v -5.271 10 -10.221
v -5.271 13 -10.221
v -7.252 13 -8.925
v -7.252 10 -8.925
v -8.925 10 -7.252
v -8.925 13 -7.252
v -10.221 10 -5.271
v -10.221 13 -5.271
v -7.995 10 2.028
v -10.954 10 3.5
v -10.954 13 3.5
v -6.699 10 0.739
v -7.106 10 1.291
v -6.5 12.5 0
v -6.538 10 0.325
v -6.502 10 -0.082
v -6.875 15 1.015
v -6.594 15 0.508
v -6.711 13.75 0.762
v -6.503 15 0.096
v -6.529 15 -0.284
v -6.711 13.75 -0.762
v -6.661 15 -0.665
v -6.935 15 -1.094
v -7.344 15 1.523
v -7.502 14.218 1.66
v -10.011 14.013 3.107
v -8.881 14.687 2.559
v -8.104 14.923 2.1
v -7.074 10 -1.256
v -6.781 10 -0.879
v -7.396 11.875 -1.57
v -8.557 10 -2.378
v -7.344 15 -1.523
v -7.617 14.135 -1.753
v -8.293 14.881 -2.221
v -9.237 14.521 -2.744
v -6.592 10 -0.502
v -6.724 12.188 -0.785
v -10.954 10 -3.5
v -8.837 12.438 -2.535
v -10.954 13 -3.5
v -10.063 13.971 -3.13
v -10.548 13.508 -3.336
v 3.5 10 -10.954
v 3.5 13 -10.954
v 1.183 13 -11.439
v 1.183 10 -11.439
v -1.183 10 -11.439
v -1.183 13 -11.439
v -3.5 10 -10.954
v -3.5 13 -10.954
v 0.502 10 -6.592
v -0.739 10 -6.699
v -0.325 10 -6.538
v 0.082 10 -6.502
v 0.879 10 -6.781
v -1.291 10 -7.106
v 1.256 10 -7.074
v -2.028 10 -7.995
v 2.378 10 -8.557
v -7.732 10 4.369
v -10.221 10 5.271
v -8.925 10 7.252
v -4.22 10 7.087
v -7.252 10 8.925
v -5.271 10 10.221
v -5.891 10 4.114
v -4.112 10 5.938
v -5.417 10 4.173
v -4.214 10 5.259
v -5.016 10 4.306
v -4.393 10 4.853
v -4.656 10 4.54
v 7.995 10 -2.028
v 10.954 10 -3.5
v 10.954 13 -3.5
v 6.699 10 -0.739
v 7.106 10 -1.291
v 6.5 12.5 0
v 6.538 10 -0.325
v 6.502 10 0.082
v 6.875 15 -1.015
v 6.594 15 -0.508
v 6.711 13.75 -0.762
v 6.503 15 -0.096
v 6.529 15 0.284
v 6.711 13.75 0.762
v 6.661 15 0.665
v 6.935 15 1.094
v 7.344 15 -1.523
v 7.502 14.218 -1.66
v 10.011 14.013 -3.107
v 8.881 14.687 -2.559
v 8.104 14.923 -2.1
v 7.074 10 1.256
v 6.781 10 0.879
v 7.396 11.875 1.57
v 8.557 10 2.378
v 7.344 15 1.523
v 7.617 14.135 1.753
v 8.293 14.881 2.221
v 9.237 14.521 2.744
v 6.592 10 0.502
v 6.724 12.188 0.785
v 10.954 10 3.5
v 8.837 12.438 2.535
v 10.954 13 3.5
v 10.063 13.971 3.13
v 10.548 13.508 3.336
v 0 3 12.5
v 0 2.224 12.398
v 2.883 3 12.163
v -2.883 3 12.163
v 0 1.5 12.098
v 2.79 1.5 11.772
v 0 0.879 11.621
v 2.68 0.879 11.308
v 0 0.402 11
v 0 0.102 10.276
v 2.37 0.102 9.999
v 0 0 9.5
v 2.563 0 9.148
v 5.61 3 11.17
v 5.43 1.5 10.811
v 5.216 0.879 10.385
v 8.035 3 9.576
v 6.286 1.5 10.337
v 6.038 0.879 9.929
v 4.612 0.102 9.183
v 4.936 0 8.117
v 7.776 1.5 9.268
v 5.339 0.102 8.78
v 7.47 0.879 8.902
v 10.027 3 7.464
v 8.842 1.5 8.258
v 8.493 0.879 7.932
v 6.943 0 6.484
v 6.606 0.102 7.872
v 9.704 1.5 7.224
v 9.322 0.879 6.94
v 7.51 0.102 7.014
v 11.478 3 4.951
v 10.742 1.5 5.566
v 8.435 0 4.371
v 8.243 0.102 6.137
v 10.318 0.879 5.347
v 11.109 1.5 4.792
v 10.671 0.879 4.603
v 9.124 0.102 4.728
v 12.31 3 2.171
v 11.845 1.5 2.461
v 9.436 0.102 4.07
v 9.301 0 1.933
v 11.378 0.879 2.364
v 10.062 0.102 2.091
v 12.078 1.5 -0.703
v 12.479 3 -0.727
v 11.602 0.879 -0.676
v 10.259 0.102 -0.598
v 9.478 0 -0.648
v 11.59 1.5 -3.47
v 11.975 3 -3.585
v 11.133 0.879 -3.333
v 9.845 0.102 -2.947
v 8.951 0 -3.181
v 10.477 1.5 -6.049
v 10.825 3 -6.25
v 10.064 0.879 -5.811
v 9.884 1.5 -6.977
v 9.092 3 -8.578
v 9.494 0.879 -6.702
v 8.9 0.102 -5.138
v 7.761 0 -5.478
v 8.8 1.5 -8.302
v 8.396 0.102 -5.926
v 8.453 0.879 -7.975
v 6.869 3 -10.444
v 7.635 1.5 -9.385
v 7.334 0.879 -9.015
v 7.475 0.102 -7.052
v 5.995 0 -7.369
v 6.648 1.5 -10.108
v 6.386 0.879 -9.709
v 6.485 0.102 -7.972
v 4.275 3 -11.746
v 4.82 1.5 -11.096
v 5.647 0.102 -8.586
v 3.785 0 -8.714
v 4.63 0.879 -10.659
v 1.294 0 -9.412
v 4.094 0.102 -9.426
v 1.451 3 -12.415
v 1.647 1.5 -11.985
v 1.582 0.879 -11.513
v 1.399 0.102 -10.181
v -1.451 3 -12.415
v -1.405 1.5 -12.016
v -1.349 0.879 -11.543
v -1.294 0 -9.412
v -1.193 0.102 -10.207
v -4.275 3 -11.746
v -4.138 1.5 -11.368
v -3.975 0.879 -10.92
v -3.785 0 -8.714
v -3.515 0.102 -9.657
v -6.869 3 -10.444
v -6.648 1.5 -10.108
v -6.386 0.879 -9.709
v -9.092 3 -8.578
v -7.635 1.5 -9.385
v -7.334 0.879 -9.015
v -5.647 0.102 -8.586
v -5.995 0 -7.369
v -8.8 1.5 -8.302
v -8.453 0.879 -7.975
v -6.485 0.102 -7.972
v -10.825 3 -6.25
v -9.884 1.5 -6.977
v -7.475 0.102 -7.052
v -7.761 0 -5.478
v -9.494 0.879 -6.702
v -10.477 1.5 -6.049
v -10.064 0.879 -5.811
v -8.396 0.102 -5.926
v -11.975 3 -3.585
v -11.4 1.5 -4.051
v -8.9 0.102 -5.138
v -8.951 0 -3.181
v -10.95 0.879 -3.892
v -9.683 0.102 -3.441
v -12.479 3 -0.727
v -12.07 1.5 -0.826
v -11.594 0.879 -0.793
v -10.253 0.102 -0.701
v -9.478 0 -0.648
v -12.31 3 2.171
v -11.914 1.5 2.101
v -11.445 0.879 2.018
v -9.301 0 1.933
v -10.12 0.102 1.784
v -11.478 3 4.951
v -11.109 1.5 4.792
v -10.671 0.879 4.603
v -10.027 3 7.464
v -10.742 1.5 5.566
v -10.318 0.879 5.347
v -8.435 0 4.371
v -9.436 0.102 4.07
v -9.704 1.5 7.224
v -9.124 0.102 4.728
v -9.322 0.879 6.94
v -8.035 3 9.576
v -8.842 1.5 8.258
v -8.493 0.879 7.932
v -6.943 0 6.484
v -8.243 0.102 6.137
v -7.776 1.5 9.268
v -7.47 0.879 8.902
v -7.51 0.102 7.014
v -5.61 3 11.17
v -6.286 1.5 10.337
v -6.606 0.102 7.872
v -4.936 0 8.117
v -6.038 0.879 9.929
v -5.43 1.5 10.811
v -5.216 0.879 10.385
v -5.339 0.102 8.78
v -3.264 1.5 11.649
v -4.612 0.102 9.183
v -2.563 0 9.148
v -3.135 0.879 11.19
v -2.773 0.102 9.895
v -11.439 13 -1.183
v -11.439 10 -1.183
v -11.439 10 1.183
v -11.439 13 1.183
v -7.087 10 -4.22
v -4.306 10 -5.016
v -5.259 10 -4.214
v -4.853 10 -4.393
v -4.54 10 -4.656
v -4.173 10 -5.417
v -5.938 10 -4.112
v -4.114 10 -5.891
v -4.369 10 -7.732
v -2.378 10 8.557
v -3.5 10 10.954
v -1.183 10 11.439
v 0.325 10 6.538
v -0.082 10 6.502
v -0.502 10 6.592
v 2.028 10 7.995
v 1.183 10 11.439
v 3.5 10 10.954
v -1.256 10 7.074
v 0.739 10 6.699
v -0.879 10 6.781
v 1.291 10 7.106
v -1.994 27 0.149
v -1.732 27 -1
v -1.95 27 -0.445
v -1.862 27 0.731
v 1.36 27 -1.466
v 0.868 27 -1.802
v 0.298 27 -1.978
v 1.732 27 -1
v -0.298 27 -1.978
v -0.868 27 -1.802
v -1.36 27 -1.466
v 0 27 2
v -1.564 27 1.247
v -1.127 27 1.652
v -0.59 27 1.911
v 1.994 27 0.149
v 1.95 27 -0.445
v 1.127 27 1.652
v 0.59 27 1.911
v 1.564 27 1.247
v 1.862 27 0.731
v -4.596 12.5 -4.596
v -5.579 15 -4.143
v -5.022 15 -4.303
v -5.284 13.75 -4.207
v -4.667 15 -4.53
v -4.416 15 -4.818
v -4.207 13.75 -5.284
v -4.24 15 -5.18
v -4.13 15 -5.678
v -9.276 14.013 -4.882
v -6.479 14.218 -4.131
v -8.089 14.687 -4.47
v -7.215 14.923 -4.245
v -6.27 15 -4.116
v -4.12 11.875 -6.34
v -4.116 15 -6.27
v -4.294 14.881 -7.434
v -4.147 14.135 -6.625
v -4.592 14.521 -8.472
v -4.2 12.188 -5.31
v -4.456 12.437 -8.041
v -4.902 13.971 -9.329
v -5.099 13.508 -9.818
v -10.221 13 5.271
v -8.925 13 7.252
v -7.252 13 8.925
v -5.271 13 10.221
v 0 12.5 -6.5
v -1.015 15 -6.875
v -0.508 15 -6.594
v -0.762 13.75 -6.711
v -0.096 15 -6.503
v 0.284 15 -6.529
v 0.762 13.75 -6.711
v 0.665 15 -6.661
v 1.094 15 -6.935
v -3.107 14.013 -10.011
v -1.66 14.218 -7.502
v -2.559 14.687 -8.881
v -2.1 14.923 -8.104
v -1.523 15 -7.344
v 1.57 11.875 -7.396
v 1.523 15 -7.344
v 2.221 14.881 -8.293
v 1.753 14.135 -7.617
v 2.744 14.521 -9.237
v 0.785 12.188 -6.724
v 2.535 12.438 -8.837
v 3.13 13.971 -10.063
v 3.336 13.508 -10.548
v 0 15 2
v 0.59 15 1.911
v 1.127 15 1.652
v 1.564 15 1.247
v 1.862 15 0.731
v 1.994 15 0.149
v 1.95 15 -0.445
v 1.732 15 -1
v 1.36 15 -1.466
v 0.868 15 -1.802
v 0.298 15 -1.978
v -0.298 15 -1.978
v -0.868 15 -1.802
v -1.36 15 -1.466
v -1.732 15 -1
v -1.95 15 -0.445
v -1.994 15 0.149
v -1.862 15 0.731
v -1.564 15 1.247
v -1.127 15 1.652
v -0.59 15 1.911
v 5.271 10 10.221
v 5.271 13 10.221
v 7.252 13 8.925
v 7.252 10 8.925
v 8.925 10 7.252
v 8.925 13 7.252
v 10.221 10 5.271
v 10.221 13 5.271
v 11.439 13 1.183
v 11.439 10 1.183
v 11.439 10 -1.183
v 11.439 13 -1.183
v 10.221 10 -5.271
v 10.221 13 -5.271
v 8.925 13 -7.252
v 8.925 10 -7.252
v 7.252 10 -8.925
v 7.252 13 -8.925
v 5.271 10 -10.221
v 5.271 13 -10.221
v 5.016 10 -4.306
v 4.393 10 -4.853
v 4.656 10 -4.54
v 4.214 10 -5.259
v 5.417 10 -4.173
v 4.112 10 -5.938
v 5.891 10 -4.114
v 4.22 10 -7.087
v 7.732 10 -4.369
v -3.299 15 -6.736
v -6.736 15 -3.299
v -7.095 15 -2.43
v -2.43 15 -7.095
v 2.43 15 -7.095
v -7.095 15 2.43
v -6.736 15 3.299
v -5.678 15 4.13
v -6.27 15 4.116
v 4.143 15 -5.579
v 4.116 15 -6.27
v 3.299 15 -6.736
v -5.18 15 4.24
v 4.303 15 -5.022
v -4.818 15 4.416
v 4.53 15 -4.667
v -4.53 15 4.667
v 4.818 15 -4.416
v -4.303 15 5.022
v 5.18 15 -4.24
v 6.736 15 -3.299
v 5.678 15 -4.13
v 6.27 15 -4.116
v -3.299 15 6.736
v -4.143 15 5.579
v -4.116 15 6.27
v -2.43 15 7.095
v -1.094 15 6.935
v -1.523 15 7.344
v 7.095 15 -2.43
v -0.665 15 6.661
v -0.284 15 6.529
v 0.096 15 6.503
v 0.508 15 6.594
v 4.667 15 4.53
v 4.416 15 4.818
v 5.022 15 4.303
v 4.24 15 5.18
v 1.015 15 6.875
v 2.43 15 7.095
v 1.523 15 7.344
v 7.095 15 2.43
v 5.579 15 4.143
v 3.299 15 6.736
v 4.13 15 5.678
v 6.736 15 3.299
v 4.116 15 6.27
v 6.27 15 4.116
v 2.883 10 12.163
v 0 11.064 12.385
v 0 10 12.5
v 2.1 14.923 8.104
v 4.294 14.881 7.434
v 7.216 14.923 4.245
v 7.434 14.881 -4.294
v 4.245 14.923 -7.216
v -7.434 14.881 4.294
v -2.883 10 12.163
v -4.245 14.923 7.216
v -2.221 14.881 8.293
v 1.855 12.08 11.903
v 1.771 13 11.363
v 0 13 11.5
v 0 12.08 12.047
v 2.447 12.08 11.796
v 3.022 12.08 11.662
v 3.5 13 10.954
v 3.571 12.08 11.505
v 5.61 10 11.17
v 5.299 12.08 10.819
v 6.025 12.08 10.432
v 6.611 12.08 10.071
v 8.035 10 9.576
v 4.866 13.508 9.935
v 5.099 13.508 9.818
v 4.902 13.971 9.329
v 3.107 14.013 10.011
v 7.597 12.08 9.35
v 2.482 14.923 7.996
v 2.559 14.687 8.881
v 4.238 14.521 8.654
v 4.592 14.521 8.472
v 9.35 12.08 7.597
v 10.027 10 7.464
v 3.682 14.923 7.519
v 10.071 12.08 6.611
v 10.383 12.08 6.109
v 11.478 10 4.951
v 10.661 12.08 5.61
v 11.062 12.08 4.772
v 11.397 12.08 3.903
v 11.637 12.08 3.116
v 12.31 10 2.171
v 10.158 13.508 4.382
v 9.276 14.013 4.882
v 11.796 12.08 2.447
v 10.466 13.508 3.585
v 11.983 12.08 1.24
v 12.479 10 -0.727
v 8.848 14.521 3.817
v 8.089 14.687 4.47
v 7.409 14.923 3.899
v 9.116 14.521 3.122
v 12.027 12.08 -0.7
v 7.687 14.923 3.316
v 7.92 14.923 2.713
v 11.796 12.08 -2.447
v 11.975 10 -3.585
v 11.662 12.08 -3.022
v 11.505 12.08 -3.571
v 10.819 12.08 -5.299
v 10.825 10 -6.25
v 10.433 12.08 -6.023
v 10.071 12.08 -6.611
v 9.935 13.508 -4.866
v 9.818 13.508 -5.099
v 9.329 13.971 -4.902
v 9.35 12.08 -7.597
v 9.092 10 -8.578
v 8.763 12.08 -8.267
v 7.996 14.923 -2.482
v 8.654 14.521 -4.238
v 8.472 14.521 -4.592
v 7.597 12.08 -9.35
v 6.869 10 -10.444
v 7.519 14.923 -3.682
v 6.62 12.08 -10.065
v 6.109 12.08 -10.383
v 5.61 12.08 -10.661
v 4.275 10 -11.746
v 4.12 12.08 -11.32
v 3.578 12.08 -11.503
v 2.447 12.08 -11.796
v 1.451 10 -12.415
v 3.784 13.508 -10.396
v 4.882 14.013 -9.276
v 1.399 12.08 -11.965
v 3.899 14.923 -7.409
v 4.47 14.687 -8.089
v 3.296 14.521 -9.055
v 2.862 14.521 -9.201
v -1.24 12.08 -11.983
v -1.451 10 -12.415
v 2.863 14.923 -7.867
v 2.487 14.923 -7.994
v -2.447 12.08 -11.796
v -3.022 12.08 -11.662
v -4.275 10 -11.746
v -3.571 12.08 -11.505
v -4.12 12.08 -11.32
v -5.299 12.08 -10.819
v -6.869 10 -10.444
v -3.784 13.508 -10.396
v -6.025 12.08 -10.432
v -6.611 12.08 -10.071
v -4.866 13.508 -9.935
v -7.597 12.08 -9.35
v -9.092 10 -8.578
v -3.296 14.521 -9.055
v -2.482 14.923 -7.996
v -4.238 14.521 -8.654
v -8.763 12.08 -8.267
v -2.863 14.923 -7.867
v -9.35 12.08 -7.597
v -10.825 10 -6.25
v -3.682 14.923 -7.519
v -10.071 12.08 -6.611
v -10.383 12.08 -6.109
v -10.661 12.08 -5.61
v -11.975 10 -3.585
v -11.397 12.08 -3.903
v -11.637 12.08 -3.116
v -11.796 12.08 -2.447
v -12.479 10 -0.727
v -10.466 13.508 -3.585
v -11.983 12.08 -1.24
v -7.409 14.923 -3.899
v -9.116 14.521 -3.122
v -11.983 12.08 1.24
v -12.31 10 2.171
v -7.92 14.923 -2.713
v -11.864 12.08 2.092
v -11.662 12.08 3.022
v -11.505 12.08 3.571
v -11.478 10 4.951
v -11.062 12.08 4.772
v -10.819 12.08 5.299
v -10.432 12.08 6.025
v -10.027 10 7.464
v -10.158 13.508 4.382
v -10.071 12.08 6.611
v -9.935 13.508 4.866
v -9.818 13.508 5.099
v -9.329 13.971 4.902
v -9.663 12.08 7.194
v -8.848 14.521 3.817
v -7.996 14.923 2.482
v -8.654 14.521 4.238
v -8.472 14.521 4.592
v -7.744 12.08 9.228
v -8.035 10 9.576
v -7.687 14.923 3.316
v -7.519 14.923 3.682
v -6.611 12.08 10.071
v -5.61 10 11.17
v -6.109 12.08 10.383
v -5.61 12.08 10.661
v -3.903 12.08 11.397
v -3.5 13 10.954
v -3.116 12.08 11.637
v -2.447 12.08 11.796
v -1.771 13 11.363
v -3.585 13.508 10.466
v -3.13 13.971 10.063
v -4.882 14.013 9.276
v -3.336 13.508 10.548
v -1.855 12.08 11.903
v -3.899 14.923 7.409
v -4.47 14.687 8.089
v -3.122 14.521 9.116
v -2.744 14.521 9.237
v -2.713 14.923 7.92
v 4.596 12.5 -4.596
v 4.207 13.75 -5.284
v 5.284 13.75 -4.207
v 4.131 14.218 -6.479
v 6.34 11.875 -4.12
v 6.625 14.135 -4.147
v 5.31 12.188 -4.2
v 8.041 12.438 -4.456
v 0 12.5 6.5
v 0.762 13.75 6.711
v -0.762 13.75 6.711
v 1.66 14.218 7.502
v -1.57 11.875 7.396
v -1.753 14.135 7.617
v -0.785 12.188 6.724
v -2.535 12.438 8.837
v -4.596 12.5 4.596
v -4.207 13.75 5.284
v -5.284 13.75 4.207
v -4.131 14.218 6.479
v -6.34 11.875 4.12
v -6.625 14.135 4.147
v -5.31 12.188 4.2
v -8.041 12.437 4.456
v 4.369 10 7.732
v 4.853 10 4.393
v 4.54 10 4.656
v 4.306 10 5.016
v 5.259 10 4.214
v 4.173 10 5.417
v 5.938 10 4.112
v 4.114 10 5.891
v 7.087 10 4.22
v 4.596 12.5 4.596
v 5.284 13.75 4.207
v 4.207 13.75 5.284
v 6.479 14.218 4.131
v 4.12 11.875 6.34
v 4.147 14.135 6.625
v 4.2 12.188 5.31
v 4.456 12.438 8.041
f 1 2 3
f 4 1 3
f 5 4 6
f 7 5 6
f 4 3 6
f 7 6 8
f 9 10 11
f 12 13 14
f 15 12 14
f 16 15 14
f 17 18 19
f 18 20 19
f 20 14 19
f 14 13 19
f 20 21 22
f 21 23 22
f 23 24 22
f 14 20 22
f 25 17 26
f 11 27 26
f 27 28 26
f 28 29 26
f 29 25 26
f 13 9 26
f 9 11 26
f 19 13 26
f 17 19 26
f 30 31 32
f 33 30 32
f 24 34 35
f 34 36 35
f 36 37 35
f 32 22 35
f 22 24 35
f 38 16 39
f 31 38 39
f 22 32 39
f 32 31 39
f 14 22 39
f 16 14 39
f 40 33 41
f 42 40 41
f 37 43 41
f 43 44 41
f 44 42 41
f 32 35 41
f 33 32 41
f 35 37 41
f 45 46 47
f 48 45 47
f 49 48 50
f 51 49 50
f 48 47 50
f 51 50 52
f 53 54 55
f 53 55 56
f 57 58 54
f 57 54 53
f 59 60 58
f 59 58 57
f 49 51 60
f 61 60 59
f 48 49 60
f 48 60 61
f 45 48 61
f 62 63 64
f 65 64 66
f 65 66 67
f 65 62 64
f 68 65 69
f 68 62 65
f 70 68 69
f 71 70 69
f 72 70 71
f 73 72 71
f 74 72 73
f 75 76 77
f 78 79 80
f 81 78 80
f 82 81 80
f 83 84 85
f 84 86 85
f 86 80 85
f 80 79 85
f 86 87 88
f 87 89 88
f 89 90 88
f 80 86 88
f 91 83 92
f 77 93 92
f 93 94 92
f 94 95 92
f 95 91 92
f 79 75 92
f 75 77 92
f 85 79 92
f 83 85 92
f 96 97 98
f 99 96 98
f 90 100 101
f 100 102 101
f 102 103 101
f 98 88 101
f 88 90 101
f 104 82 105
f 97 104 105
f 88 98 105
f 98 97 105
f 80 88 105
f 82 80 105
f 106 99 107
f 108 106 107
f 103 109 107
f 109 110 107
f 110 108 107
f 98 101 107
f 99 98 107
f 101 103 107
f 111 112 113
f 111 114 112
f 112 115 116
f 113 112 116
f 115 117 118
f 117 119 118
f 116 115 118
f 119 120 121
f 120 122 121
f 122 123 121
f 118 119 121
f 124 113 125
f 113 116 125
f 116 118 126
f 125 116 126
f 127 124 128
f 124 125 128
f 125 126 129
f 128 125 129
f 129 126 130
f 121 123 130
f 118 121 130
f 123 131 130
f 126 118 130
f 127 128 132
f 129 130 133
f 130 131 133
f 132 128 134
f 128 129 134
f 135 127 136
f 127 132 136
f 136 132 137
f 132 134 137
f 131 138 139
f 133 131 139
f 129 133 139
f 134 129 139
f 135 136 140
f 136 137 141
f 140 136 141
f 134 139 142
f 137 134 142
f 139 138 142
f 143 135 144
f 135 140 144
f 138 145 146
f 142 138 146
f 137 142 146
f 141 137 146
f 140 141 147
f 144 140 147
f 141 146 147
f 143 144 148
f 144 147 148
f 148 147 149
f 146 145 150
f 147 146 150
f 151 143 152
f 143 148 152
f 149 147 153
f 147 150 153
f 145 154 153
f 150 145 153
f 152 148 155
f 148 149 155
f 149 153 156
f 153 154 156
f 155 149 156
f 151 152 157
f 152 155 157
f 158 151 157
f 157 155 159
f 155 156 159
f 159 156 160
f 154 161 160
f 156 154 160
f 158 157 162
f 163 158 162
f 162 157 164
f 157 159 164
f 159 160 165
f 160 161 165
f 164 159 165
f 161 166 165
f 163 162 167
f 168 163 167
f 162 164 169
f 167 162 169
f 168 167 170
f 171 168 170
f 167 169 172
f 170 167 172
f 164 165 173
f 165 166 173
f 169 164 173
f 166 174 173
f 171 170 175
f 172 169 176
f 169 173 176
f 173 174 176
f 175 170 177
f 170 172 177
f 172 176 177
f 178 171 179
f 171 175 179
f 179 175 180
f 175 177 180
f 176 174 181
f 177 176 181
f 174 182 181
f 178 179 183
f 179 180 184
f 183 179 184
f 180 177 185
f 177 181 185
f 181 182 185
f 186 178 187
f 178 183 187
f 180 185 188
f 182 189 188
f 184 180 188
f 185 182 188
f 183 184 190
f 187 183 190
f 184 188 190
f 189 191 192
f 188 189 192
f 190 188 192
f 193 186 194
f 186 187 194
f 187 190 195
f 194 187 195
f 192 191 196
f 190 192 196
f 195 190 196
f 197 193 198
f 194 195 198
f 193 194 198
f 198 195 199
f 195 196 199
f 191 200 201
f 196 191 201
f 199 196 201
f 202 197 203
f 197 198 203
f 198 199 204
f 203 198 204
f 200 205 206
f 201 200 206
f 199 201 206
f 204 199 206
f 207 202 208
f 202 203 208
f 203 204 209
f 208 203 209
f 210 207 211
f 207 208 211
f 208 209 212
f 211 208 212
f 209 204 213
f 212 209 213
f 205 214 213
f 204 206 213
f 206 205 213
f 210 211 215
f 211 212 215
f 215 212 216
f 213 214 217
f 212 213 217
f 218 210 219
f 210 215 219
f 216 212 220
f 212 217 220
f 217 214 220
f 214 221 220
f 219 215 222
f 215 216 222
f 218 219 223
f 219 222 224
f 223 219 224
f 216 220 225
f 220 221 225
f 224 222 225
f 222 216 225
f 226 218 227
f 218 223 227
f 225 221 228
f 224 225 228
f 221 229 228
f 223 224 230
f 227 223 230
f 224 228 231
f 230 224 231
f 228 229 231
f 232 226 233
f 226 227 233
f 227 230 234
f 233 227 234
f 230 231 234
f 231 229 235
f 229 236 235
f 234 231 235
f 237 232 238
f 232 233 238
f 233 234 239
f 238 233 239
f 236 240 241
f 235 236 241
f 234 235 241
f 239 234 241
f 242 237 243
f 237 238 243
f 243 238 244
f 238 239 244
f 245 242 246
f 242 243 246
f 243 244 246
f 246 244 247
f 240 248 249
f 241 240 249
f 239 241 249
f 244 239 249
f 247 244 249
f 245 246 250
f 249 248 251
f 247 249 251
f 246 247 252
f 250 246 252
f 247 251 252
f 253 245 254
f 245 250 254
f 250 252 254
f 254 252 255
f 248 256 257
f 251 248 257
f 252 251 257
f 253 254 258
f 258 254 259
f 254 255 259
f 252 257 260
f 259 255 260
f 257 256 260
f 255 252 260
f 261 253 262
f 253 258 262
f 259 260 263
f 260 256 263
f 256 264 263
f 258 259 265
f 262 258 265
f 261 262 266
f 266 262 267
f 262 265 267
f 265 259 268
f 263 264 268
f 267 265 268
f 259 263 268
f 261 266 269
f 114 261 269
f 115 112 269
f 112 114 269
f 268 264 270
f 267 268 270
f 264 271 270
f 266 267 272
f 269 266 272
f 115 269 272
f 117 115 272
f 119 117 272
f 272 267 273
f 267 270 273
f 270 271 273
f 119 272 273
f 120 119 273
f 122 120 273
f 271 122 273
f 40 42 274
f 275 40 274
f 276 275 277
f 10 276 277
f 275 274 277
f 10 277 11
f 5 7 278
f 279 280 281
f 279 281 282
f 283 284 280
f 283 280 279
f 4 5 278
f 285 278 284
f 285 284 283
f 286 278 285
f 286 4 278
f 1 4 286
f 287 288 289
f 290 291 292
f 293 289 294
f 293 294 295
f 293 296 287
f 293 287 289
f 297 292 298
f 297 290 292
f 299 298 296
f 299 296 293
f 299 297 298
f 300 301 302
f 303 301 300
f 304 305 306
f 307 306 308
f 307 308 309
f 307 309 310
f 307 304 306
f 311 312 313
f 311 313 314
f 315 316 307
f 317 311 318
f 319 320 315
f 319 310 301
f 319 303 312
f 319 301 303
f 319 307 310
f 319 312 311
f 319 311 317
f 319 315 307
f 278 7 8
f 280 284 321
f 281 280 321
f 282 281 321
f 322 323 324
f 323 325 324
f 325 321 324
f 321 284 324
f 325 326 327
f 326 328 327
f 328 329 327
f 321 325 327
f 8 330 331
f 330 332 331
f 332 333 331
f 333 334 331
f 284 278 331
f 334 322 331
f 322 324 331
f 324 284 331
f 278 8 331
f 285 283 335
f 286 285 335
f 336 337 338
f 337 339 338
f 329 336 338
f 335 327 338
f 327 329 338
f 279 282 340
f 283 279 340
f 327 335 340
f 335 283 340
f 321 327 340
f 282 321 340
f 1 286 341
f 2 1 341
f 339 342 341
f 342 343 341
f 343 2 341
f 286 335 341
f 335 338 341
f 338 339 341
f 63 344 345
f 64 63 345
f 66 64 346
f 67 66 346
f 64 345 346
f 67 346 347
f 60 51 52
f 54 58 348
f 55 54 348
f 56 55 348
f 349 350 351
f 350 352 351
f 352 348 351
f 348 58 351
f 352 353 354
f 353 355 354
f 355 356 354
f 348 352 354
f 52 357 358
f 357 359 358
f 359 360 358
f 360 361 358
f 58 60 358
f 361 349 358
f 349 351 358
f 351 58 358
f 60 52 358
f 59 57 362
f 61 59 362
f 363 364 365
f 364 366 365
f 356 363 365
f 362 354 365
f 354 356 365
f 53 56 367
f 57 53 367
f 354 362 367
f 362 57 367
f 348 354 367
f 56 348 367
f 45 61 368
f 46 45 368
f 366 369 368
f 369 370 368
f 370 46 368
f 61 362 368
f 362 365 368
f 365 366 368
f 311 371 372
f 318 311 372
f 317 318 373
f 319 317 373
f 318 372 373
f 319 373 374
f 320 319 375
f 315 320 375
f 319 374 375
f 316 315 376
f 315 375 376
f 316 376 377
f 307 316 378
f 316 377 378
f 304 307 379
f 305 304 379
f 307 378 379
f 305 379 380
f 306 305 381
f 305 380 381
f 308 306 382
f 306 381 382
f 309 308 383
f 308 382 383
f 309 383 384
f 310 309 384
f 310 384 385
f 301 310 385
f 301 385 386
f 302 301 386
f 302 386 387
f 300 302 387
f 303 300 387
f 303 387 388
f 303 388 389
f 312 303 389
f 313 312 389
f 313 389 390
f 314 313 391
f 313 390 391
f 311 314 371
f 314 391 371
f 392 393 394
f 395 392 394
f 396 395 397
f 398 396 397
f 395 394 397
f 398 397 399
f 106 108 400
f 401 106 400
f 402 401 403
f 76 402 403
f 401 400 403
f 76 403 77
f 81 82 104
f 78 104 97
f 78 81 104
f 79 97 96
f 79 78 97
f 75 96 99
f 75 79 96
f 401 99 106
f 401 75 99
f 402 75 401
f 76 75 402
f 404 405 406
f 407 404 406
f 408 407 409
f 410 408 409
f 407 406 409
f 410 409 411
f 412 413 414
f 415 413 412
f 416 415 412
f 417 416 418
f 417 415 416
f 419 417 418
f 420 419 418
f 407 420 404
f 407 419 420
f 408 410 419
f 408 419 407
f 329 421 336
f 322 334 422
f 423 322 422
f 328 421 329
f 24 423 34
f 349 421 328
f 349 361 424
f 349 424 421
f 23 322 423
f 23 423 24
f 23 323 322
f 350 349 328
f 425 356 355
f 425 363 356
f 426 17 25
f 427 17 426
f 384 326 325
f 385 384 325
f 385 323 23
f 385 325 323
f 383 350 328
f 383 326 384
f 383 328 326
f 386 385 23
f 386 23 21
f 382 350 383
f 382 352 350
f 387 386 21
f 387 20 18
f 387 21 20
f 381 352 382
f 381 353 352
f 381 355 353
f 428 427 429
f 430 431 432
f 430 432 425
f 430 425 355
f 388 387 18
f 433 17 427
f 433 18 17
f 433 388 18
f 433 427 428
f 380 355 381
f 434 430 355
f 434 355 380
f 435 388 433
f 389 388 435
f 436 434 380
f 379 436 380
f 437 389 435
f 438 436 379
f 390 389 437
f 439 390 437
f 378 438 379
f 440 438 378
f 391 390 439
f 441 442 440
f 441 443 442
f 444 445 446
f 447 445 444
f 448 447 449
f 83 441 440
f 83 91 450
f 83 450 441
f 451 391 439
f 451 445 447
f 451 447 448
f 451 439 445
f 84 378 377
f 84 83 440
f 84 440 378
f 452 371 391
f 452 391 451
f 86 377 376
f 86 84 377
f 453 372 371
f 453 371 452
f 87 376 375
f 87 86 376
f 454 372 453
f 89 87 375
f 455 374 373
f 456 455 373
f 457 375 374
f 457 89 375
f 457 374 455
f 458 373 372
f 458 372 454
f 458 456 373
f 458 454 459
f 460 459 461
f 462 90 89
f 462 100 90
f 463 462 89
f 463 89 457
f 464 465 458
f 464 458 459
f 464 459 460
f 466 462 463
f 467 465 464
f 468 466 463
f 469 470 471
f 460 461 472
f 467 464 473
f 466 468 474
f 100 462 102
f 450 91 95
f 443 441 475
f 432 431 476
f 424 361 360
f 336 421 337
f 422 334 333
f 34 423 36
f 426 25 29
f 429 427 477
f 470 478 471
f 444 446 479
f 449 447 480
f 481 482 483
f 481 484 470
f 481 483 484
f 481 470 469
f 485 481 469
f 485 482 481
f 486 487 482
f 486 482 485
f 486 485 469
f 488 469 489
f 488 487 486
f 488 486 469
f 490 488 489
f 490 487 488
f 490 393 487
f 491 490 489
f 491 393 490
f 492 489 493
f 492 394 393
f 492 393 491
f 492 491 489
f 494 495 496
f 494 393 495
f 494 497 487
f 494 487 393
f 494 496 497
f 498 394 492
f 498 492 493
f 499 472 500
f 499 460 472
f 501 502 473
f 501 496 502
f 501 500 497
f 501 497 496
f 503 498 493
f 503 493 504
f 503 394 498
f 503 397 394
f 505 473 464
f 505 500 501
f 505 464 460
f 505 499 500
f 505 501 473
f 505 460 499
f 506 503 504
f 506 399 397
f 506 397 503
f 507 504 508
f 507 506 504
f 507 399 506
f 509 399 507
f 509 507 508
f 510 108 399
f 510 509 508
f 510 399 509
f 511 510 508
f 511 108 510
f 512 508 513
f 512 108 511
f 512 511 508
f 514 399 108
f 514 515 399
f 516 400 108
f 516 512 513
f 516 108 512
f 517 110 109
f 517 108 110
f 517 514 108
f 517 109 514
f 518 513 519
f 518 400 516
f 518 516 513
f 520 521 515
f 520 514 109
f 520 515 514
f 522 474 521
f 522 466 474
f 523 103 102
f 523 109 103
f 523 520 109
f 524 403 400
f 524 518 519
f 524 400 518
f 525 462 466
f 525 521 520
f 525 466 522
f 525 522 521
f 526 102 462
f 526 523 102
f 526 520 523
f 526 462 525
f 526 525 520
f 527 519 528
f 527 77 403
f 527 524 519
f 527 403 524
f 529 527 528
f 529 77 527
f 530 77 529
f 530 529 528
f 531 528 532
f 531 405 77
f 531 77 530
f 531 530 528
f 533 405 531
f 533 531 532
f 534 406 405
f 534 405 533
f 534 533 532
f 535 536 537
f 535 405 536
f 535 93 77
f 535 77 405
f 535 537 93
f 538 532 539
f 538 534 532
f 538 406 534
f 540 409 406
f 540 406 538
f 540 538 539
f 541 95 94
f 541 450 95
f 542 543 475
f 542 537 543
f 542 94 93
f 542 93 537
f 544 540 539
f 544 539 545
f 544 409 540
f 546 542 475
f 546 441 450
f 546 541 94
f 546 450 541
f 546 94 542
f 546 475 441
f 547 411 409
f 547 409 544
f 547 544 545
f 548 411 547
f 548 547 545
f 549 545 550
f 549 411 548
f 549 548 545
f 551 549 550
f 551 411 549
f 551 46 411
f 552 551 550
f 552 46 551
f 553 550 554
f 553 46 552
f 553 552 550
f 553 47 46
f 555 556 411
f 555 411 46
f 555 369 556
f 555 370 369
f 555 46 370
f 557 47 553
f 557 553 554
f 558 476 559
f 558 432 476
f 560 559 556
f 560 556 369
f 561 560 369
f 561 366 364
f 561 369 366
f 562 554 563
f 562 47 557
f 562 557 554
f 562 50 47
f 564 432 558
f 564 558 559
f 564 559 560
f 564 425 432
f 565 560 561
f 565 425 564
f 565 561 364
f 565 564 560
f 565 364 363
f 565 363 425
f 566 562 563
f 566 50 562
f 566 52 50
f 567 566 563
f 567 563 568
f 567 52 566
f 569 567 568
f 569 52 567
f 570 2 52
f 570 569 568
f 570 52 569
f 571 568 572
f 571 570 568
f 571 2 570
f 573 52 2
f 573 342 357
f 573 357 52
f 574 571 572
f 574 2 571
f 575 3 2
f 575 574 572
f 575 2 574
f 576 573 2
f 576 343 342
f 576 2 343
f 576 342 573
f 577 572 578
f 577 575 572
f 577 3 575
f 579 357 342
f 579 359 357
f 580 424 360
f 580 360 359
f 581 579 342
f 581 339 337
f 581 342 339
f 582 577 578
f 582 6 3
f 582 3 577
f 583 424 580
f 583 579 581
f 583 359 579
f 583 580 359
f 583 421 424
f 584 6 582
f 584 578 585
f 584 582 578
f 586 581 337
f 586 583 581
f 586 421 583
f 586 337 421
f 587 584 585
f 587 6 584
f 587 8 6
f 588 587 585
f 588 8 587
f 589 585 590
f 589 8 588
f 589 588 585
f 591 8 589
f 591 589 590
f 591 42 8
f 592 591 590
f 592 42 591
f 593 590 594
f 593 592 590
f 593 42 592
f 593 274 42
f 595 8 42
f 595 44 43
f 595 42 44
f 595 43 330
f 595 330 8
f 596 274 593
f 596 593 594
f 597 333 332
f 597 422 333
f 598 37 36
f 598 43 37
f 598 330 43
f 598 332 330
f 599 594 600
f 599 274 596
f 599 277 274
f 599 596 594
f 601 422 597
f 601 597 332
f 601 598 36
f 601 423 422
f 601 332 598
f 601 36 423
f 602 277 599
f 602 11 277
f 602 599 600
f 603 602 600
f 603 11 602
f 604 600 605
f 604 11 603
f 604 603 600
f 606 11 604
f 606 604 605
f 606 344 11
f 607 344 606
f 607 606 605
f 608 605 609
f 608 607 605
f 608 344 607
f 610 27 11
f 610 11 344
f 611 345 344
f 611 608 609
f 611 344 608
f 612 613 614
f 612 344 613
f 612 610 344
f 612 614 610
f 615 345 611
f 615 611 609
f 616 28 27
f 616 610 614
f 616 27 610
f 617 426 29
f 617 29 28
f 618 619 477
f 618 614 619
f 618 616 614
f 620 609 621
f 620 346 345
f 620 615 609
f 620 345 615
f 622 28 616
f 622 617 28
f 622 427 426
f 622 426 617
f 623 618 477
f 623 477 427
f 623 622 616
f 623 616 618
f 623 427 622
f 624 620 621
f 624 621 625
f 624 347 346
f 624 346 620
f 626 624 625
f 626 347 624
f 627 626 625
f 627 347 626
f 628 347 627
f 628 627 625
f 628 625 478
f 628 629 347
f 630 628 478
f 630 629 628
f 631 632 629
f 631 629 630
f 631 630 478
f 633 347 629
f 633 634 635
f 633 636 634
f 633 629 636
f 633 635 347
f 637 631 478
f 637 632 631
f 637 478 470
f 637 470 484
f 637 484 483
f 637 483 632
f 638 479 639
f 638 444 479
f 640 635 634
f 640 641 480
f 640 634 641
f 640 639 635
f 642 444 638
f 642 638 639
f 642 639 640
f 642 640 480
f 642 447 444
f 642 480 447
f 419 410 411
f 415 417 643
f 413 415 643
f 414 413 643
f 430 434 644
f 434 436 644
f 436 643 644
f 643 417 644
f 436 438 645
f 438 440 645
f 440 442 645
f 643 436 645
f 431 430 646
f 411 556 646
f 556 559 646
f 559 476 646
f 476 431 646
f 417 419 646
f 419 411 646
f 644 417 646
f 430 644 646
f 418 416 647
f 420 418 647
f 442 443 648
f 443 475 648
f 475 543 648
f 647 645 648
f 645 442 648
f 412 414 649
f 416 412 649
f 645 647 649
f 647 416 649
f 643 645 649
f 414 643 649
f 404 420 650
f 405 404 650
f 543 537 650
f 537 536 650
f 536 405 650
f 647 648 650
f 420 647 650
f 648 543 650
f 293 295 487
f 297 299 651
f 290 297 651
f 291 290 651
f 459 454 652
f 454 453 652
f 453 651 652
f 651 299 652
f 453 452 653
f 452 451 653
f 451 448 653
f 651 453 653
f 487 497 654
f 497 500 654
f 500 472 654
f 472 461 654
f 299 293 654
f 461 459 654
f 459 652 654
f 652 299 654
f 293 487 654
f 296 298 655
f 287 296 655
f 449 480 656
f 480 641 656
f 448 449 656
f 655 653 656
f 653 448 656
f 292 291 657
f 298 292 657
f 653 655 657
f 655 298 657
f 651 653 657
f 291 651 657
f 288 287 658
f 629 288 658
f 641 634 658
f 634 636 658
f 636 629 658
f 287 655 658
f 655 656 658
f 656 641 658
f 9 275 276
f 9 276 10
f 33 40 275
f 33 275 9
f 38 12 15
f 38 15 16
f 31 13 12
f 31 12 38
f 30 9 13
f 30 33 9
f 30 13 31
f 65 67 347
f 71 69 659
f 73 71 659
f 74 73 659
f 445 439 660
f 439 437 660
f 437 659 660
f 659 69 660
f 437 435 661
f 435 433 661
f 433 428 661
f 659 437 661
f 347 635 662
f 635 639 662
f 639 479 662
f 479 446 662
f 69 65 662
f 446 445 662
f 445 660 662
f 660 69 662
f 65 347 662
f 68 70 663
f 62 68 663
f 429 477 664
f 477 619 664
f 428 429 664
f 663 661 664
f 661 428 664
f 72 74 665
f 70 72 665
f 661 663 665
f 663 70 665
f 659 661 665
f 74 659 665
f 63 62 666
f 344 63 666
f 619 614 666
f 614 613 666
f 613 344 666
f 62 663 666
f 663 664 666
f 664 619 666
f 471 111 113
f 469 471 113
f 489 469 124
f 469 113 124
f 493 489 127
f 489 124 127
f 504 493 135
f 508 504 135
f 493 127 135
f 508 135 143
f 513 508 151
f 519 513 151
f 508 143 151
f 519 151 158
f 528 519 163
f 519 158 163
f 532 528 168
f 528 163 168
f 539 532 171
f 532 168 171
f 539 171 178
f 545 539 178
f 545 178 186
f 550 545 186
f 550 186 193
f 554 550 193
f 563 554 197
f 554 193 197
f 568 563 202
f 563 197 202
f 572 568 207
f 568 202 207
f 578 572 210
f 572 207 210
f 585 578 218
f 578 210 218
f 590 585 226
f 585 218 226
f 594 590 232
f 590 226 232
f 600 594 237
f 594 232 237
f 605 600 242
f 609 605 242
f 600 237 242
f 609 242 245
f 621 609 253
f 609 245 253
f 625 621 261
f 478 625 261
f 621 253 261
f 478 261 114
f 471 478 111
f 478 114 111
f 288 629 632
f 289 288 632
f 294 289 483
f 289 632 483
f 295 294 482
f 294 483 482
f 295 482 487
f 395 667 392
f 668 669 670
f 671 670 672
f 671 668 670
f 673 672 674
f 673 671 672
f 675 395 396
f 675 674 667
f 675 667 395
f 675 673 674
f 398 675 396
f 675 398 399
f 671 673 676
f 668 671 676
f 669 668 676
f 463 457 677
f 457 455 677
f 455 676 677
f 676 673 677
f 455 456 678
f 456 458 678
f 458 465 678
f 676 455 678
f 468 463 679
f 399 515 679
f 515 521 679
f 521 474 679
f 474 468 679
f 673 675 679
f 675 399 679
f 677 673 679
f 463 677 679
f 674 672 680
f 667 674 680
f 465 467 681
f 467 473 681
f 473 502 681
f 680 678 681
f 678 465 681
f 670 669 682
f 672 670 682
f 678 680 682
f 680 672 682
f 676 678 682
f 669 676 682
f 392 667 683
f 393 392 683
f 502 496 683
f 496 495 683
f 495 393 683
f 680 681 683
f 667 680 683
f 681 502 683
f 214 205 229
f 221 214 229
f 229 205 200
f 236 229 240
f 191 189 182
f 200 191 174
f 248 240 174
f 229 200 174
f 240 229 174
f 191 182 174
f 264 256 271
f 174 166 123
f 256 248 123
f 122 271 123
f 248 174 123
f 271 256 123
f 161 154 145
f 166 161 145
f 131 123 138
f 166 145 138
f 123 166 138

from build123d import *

# Parameters (mm, degrees)
SKETCH1_R           = 12.5
BOSS_EXTRUDE1_DEPTH = 15
SKETCH2_R           = 2
BOSS_EXTRUDE2_DEPTH = 12
FILLET1_R           = 5
FILLET2_R           = 3
CUT_EXTRUDE1_DEPTH  = 5


with BuildPart() as part:
    # Sketch1 → Boss-Extrude1 (new body)
    with BuildSketch(Plane(origin=(0, 0, 0), x_dir=(1, 0, 0), z_dir=(0, 1, 0))):
        with Locations(Location((0, 0, 0), (0, 0, 270))):
            Circle(SKETCH1_R)
    extrude(amount=BOSS_EXTRUDE1_DEPTH)

    # Sketch2 → Boss-Extrude2 (add)
    with BuildSketch(Plane(origin=(0, 15, 0), x_dir=(1, 0, 0), z_dir=(0, 1, 0))):
        with Locations(Location((0, 0, 0), (0, 0, 270))):
            Circle(SKETCH2_R)
    extrude(amount=BOSS_EXTRUDE2_DEPTH)

    # Fillet1
    fillet1_edges = [part.edges().sort_by_distance(p)[0] for p in [
        (0, 15, -12.5),
    ]]
    fillet(fillet1_edges, radius=FILLET1_R)

    # Fillet2
    fillet2_edges = [part.edges().sort_by_distance(p)[0] for p in [
        (0, 0, -12.5),
    ]]
    fillet(fillet2_edges, radius=FILLET2_R)

    # Sketch3 → Cut-Extrude1 (cut)
    with BuildSketch(Plane(origin=(0, 15, 0), x_dir=(1, 0, 0), z_dir=(0, 1, 0))):
        with BuildLine():
            ThreePointArc((3.5, 10.95445115), (0, 11.5), (-3.5, 10.95445115))
            add(Edge.make_bspline(
                [(-3.5, 10.95445115), (0, 2.04554885), (3.5, 10.95445115)],
                knots=[0, 0, 0, 1, 1, 1], degree=2))
        make_face()
        with BuildLine():
            ThreePointArc((10.220840427, 5.271092958), (8.131727984, 8.131727984), (5.271092958, 10.220840427))
            add(Edge.make_bspline(
                [(5.271092958, 10.220840427), (1.446421463, 1.446421463), (10.220840427, 5.271092958)],
                knots=[0, 0, 0, 1, 1, 1], degree=2))
        make_face()
        with BuildLine():
            ThreePointArc((10.95445115, -3.5), (11.5, 0), (10.95445115, 3.5))
            add(Edge.make_bspline(
                [(10.95445115, 3.5), (2.04554885, 0), (10.95445115, -3.5)],
                knots=[0, 0, 0, 1, 1, 1], degree=2))
        make_face()
        with BuildLine():
            ThreePointArc((5.271092958, -10.220840427), (8.131727984, -8.131727984), (10.220840427, -5.271092958))
            add(Edge.make_bspline(
                [(10.220840427, -5.271092958), (1.446421463, -1.446421463), (5.271092958, -10.220840427)],
                knots=[0, 0, 0, 1, 1, 1], degree=2))
        make_face()
        with BuildLine():
            ThreePointArc((-3.5, -10.95445115), (0, -11.5), (3.5, -10.95445115))
            add(Edge.make_bspline(
                [(3.5, -10.95445115), (0, -2.04554885), (-3.5, -10.95445115)],
                knots=[0, 0, 0, 1, 1, 1], degree=2))
        make_face()
        with BuildLine():
            ThreePointArc((-10.220840427, -5.271092958), (-8.131727984, -8.131727984), (-5.271092958, -10.220840427))
            add(Edge.make_bspline(
                [(-5.271092958, -10.220840427), (-1.446421463, -1.446421463), (-10.220840427, -5.271092958)],
                knots=[0, 0, 0, 1, 1, 1], degree=2))
        make_face()
        with BuildLine():
            ThreePointArc((-10.95445115, 3.5), (-11.5, 0), (-10.95445115, -3.5))
            add(Edge.make_bspline(
                [(-10.95445115, -3.5), (-2.04554885, 0), (-10.95445115, 3.5)],
                knots=[0, 0, 0, 1, 1, 1], degree=2))
        make_face()
        with BuildLine():
            ThreePointArc((-5.271092958, 10.220840427), (-8.131727984, 8.131727984), (-10.220840427, 5.271092958))
            add(Edge.make_bspline(
                [(-10.220840427, 5.271092958), (-1.446421463, 1.446421463), (-5.271092958, 10.220840427)],
                knots=[0, 0, 0, 1, 1, 1], degree=2))
        make_face()
    extrude(amount=-CUT_EXTRUDE1_DEPTH, mode=Mode.SUBTRACT)


solid = part.part
